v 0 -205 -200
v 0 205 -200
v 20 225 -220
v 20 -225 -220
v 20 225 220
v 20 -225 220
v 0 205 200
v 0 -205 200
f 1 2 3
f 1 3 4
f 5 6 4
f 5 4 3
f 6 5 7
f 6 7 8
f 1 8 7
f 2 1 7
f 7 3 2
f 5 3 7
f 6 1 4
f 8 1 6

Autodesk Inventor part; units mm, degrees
ref_plane "YZ Plane" through (0, 0, 0) normal (1, 0, 0) x (0, 1, 0)
ref_plane "XZ Plane" through (0, 0, 0) normal (0, 1, 0) x (-1, 0, 0)
ref_plane "XY Plane" through (0, 0, 0) normal (0, 0, 1) x (1, 0, 0)
sketch "Skizze1" plane through (0, 0, 0) normal (1, 0, 0) x (0, 1, 0)
  line L0 (0, -308) -> (0, 308) projected
  line L1 (-315, 0) -> (315, 0) projected
  line L2 (225, 220) -> (-225, 220)
  line L3 (-225, 220) -> (-225, -220)
  line L4 (-225, -220) -> (225, -220)
  line L5 (225, -220) -> (225, 220)
  point P0 (0, 0)
  dimension "d0" = 440
  dimension "d1" = 450
extrude "Extrusion1" add sketch "Skizze1" along normal blind 20
chamfer "Fase1" distance 20 angle 45 4 edges at (0, 0, 220) (0, 225, 0) (0, 0, -220) (0, -225, 0)
properties part number "Wand2"
